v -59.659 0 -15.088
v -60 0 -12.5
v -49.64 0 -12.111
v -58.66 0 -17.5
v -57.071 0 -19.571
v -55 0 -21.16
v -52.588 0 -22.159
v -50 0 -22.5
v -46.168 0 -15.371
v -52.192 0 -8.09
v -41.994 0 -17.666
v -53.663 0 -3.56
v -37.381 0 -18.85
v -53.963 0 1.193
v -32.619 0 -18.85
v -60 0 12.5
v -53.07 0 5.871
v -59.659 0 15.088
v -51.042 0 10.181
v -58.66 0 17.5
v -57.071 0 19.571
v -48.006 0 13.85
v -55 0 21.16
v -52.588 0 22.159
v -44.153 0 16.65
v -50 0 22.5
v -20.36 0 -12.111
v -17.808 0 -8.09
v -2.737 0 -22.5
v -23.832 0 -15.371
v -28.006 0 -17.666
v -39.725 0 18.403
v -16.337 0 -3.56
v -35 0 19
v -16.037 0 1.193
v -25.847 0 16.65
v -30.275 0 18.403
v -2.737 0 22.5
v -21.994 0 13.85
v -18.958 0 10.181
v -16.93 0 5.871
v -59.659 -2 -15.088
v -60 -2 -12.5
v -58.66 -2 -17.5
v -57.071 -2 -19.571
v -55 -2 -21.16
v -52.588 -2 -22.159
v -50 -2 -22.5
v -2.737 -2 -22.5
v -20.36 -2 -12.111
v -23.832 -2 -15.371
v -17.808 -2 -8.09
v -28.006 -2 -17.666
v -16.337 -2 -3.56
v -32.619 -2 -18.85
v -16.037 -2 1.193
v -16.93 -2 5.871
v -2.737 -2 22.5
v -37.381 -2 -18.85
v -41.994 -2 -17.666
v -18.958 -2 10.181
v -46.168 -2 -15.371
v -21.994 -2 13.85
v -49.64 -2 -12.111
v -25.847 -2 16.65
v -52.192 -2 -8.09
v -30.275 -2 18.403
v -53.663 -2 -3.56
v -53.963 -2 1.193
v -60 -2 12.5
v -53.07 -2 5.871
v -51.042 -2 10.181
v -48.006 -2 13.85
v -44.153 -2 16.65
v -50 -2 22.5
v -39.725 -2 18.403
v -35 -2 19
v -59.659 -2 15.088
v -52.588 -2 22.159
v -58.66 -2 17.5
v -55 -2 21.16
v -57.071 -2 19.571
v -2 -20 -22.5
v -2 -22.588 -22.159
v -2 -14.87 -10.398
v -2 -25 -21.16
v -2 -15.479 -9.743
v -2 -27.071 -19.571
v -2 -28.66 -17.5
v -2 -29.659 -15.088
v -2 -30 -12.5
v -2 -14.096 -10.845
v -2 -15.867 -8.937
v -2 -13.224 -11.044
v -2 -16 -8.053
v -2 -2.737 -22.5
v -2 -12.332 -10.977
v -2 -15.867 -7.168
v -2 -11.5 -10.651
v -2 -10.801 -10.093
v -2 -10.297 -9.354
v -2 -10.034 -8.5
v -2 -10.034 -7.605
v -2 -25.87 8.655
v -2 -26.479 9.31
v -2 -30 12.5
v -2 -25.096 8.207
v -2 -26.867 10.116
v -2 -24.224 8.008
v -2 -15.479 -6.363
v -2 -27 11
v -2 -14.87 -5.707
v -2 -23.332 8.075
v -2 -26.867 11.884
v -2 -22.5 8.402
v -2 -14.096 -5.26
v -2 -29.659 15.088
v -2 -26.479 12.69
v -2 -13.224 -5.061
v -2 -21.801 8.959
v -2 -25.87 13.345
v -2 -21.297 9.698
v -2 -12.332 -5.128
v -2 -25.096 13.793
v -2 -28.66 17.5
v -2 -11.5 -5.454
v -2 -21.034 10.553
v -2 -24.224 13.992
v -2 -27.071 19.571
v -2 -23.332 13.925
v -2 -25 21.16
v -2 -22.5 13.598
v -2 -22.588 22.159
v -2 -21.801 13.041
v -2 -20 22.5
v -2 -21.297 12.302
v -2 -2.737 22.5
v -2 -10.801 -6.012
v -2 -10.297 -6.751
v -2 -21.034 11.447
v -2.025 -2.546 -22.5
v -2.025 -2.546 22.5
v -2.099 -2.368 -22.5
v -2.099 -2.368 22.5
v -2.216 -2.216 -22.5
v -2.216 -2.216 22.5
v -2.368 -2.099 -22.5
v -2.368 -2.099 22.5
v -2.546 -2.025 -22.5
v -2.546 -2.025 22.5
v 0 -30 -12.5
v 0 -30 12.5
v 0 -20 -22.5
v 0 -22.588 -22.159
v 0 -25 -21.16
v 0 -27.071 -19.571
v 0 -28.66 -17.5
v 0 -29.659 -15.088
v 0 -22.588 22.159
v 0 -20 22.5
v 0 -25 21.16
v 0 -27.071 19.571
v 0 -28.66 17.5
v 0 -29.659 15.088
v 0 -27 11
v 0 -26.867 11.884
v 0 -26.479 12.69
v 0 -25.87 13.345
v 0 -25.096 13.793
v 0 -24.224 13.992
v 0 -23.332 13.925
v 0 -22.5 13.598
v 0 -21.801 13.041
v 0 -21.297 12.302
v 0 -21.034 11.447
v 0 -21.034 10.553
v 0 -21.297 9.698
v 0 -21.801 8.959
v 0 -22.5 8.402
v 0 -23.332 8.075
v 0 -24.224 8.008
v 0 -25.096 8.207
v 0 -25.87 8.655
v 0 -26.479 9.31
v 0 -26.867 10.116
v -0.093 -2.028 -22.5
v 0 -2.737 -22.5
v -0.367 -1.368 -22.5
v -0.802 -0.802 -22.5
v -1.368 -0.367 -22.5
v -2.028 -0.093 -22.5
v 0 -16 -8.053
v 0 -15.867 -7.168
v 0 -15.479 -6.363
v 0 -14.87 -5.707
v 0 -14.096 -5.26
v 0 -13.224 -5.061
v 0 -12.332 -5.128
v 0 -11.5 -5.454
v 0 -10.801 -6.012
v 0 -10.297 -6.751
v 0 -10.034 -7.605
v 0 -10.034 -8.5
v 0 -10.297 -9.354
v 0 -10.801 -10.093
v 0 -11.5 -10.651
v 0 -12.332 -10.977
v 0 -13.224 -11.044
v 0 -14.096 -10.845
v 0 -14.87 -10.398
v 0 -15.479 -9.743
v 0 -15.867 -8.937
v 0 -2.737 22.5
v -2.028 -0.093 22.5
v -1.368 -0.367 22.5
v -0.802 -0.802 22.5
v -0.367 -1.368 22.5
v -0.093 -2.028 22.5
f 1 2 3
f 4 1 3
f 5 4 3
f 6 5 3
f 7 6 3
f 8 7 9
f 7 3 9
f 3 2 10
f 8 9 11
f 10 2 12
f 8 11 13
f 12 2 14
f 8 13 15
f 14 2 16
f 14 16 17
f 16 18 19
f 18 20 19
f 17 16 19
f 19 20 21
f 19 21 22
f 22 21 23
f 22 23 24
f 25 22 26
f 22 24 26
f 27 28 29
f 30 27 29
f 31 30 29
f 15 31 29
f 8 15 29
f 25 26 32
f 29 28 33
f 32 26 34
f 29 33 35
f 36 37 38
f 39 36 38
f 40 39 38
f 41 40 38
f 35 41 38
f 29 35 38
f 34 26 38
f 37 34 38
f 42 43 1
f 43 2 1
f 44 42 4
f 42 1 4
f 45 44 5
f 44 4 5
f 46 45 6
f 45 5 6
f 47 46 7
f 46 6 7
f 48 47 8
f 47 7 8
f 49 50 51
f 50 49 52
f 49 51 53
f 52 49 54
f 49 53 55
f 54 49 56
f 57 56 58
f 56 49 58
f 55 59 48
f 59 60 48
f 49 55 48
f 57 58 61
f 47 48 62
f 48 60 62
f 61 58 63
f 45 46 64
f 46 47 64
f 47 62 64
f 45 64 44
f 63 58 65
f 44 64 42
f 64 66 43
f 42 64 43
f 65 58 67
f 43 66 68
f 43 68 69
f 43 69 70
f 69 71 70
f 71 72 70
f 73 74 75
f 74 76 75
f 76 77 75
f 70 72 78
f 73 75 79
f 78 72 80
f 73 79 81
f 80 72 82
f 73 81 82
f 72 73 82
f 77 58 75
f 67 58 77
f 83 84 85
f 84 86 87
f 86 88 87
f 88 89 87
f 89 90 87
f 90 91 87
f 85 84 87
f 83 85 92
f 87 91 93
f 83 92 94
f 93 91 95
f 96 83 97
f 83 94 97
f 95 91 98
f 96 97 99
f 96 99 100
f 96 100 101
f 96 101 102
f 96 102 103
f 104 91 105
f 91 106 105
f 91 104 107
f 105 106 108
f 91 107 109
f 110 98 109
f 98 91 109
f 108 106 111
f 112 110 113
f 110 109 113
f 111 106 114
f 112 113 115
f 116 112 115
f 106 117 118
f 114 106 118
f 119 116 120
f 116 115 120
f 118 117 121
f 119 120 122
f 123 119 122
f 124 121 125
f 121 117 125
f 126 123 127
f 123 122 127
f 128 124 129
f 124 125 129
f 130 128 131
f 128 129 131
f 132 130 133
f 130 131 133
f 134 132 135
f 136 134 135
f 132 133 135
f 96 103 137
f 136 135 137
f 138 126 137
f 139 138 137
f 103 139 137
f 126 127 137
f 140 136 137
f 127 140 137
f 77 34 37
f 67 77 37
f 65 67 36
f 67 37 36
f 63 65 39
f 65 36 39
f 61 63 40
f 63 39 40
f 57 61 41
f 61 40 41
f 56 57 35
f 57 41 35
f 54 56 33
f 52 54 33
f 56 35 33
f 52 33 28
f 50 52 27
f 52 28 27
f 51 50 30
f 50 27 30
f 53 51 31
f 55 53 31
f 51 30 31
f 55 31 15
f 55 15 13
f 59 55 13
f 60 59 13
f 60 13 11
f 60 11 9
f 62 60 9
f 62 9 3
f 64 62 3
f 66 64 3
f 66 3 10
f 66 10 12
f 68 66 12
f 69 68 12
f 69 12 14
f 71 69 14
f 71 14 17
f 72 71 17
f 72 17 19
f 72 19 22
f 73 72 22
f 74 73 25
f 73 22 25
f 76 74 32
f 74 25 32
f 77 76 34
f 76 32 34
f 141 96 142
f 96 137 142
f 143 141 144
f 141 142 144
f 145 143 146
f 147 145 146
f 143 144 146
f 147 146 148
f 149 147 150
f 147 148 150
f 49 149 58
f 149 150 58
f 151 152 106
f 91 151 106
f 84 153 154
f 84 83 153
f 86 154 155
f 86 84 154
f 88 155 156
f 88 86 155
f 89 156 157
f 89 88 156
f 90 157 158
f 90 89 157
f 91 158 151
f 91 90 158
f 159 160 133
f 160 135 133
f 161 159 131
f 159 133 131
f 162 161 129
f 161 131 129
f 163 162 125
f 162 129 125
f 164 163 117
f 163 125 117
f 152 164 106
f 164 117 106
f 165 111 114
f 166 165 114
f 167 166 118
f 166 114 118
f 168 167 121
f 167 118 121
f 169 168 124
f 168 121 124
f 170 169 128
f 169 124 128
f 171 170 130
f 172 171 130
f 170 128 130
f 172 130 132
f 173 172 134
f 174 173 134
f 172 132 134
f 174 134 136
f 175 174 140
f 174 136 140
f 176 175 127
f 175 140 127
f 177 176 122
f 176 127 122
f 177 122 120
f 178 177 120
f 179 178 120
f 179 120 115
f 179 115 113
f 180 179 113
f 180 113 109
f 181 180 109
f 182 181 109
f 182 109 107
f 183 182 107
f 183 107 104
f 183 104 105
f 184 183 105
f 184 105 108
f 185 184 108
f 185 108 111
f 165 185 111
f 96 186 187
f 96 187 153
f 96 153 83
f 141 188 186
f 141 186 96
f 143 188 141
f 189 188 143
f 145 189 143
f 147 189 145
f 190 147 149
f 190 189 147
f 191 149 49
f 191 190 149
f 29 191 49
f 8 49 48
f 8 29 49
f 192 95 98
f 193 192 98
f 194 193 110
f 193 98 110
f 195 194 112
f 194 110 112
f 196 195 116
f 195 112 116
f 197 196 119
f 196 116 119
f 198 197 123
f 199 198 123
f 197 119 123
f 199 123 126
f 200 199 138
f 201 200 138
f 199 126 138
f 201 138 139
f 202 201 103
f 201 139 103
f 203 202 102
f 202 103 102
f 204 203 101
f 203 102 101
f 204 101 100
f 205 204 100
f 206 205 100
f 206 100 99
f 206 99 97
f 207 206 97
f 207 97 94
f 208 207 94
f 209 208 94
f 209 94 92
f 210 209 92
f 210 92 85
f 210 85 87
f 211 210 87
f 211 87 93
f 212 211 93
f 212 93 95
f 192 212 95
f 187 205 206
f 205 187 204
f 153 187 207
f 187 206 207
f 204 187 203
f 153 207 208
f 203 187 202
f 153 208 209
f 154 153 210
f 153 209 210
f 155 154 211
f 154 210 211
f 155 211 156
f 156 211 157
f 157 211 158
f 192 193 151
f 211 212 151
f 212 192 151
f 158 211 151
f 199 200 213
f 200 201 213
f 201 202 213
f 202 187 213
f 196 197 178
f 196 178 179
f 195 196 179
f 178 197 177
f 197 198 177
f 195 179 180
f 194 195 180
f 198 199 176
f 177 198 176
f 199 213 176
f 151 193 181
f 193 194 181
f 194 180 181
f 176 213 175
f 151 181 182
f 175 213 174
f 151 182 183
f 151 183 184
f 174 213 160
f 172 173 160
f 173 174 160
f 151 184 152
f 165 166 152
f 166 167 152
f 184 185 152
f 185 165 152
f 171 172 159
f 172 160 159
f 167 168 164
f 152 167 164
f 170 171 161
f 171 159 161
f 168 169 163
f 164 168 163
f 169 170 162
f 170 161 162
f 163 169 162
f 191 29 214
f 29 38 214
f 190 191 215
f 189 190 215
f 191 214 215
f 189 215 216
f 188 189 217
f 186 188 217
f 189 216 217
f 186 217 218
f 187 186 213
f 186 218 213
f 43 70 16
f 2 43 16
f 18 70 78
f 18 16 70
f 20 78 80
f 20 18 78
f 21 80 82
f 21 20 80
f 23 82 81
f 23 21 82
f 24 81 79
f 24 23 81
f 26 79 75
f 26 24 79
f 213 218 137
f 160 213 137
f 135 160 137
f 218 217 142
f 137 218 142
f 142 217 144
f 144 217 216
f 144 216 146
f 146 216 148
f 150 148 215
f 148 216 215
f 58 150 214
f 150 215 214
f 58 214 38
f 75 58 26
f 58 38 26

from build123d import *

# Parameters (mm, degrees)
SM_BASE_FLANGE_1_DEPTH = 22.5
SKETCH_3_R             = 19
CUT_EXTRUDE_1_DEPTH    = 71.75485849
FILLET_1_R             = 10
SKETCH_6_R             = 3
CUT_EXTRUDE_3_DEPTH    = 70.06699646


# Sheet-metal steps are written as plain solids
with BuildPart() as part:
    # Sketch 1 → 基体-法兰1 (new, symmetric)
    with BuildSketch(Plane.XY):
        with BuildLine():
            Line((-60, 0), (-2.7366, 0))
            ThreePointArc((-2.7366, 0), (-0.801531583, -0.801531583), (0, -2.7366))
            Line((0, -2.7366), (0, -30))
            Line((0, -30), (-2, -30))
            Line((-2, -30), (-2, -2.7366))
            ThreePointArc((-2, -2.7366), (-2.215745145, -2.215745145), (-2.7366, -2))
            Line((-2.7366, -2), (-60, -2))
            Line((-60, -2), (-60, 0))
        make_face()
    extrude(amount=SM_BASE_FLANGE_1_DEPTH, both=True)

    # 草图3 → 切除-拉伸1 (cut, through all)
    with BuildSketch(Plane(origin=(0, 0, 0), x_dir=(1, 0, 0), z_dir=(0, 1, 0))):
        with Locations(Location((-35, 0, 0), (0, 0, 270))):
            Circle(SKETCH_3_R)
    extrude(amount=-CUT_EXTRUDE_1_DEPTH, mode=Mode.SUBTRACT)

    # 圆角1
    fillet_1_edges = [part.edges().sort_by_distance(p)[0] for p in [
        (-60, -1, 22.5),
        (-1, -30, 22.5),
        (-60, -1, -22.5),
        (-1, -30, -22.5),
    ]]
    fillet(fillet_1_edges, radius=FILLET_1_R)

    # 草图6 → 切除-拉伸3 (cut, through all)
    with BuildSketch(Plane.ZY.offset(2)):
        with Locations(Location((11, -24, 0), (0, 0, 270))):
            Circle(SKETCH_6_R)
        with Locations(Location((-8.052558883, -13, 0), (0, 0, 270))):
            Circle(SKETCH_6_R)
    extrude(amount=-CUT_EXTRUDE_3_DEPTH, mode=Mode.SUBTRACT)


solid = part.part
